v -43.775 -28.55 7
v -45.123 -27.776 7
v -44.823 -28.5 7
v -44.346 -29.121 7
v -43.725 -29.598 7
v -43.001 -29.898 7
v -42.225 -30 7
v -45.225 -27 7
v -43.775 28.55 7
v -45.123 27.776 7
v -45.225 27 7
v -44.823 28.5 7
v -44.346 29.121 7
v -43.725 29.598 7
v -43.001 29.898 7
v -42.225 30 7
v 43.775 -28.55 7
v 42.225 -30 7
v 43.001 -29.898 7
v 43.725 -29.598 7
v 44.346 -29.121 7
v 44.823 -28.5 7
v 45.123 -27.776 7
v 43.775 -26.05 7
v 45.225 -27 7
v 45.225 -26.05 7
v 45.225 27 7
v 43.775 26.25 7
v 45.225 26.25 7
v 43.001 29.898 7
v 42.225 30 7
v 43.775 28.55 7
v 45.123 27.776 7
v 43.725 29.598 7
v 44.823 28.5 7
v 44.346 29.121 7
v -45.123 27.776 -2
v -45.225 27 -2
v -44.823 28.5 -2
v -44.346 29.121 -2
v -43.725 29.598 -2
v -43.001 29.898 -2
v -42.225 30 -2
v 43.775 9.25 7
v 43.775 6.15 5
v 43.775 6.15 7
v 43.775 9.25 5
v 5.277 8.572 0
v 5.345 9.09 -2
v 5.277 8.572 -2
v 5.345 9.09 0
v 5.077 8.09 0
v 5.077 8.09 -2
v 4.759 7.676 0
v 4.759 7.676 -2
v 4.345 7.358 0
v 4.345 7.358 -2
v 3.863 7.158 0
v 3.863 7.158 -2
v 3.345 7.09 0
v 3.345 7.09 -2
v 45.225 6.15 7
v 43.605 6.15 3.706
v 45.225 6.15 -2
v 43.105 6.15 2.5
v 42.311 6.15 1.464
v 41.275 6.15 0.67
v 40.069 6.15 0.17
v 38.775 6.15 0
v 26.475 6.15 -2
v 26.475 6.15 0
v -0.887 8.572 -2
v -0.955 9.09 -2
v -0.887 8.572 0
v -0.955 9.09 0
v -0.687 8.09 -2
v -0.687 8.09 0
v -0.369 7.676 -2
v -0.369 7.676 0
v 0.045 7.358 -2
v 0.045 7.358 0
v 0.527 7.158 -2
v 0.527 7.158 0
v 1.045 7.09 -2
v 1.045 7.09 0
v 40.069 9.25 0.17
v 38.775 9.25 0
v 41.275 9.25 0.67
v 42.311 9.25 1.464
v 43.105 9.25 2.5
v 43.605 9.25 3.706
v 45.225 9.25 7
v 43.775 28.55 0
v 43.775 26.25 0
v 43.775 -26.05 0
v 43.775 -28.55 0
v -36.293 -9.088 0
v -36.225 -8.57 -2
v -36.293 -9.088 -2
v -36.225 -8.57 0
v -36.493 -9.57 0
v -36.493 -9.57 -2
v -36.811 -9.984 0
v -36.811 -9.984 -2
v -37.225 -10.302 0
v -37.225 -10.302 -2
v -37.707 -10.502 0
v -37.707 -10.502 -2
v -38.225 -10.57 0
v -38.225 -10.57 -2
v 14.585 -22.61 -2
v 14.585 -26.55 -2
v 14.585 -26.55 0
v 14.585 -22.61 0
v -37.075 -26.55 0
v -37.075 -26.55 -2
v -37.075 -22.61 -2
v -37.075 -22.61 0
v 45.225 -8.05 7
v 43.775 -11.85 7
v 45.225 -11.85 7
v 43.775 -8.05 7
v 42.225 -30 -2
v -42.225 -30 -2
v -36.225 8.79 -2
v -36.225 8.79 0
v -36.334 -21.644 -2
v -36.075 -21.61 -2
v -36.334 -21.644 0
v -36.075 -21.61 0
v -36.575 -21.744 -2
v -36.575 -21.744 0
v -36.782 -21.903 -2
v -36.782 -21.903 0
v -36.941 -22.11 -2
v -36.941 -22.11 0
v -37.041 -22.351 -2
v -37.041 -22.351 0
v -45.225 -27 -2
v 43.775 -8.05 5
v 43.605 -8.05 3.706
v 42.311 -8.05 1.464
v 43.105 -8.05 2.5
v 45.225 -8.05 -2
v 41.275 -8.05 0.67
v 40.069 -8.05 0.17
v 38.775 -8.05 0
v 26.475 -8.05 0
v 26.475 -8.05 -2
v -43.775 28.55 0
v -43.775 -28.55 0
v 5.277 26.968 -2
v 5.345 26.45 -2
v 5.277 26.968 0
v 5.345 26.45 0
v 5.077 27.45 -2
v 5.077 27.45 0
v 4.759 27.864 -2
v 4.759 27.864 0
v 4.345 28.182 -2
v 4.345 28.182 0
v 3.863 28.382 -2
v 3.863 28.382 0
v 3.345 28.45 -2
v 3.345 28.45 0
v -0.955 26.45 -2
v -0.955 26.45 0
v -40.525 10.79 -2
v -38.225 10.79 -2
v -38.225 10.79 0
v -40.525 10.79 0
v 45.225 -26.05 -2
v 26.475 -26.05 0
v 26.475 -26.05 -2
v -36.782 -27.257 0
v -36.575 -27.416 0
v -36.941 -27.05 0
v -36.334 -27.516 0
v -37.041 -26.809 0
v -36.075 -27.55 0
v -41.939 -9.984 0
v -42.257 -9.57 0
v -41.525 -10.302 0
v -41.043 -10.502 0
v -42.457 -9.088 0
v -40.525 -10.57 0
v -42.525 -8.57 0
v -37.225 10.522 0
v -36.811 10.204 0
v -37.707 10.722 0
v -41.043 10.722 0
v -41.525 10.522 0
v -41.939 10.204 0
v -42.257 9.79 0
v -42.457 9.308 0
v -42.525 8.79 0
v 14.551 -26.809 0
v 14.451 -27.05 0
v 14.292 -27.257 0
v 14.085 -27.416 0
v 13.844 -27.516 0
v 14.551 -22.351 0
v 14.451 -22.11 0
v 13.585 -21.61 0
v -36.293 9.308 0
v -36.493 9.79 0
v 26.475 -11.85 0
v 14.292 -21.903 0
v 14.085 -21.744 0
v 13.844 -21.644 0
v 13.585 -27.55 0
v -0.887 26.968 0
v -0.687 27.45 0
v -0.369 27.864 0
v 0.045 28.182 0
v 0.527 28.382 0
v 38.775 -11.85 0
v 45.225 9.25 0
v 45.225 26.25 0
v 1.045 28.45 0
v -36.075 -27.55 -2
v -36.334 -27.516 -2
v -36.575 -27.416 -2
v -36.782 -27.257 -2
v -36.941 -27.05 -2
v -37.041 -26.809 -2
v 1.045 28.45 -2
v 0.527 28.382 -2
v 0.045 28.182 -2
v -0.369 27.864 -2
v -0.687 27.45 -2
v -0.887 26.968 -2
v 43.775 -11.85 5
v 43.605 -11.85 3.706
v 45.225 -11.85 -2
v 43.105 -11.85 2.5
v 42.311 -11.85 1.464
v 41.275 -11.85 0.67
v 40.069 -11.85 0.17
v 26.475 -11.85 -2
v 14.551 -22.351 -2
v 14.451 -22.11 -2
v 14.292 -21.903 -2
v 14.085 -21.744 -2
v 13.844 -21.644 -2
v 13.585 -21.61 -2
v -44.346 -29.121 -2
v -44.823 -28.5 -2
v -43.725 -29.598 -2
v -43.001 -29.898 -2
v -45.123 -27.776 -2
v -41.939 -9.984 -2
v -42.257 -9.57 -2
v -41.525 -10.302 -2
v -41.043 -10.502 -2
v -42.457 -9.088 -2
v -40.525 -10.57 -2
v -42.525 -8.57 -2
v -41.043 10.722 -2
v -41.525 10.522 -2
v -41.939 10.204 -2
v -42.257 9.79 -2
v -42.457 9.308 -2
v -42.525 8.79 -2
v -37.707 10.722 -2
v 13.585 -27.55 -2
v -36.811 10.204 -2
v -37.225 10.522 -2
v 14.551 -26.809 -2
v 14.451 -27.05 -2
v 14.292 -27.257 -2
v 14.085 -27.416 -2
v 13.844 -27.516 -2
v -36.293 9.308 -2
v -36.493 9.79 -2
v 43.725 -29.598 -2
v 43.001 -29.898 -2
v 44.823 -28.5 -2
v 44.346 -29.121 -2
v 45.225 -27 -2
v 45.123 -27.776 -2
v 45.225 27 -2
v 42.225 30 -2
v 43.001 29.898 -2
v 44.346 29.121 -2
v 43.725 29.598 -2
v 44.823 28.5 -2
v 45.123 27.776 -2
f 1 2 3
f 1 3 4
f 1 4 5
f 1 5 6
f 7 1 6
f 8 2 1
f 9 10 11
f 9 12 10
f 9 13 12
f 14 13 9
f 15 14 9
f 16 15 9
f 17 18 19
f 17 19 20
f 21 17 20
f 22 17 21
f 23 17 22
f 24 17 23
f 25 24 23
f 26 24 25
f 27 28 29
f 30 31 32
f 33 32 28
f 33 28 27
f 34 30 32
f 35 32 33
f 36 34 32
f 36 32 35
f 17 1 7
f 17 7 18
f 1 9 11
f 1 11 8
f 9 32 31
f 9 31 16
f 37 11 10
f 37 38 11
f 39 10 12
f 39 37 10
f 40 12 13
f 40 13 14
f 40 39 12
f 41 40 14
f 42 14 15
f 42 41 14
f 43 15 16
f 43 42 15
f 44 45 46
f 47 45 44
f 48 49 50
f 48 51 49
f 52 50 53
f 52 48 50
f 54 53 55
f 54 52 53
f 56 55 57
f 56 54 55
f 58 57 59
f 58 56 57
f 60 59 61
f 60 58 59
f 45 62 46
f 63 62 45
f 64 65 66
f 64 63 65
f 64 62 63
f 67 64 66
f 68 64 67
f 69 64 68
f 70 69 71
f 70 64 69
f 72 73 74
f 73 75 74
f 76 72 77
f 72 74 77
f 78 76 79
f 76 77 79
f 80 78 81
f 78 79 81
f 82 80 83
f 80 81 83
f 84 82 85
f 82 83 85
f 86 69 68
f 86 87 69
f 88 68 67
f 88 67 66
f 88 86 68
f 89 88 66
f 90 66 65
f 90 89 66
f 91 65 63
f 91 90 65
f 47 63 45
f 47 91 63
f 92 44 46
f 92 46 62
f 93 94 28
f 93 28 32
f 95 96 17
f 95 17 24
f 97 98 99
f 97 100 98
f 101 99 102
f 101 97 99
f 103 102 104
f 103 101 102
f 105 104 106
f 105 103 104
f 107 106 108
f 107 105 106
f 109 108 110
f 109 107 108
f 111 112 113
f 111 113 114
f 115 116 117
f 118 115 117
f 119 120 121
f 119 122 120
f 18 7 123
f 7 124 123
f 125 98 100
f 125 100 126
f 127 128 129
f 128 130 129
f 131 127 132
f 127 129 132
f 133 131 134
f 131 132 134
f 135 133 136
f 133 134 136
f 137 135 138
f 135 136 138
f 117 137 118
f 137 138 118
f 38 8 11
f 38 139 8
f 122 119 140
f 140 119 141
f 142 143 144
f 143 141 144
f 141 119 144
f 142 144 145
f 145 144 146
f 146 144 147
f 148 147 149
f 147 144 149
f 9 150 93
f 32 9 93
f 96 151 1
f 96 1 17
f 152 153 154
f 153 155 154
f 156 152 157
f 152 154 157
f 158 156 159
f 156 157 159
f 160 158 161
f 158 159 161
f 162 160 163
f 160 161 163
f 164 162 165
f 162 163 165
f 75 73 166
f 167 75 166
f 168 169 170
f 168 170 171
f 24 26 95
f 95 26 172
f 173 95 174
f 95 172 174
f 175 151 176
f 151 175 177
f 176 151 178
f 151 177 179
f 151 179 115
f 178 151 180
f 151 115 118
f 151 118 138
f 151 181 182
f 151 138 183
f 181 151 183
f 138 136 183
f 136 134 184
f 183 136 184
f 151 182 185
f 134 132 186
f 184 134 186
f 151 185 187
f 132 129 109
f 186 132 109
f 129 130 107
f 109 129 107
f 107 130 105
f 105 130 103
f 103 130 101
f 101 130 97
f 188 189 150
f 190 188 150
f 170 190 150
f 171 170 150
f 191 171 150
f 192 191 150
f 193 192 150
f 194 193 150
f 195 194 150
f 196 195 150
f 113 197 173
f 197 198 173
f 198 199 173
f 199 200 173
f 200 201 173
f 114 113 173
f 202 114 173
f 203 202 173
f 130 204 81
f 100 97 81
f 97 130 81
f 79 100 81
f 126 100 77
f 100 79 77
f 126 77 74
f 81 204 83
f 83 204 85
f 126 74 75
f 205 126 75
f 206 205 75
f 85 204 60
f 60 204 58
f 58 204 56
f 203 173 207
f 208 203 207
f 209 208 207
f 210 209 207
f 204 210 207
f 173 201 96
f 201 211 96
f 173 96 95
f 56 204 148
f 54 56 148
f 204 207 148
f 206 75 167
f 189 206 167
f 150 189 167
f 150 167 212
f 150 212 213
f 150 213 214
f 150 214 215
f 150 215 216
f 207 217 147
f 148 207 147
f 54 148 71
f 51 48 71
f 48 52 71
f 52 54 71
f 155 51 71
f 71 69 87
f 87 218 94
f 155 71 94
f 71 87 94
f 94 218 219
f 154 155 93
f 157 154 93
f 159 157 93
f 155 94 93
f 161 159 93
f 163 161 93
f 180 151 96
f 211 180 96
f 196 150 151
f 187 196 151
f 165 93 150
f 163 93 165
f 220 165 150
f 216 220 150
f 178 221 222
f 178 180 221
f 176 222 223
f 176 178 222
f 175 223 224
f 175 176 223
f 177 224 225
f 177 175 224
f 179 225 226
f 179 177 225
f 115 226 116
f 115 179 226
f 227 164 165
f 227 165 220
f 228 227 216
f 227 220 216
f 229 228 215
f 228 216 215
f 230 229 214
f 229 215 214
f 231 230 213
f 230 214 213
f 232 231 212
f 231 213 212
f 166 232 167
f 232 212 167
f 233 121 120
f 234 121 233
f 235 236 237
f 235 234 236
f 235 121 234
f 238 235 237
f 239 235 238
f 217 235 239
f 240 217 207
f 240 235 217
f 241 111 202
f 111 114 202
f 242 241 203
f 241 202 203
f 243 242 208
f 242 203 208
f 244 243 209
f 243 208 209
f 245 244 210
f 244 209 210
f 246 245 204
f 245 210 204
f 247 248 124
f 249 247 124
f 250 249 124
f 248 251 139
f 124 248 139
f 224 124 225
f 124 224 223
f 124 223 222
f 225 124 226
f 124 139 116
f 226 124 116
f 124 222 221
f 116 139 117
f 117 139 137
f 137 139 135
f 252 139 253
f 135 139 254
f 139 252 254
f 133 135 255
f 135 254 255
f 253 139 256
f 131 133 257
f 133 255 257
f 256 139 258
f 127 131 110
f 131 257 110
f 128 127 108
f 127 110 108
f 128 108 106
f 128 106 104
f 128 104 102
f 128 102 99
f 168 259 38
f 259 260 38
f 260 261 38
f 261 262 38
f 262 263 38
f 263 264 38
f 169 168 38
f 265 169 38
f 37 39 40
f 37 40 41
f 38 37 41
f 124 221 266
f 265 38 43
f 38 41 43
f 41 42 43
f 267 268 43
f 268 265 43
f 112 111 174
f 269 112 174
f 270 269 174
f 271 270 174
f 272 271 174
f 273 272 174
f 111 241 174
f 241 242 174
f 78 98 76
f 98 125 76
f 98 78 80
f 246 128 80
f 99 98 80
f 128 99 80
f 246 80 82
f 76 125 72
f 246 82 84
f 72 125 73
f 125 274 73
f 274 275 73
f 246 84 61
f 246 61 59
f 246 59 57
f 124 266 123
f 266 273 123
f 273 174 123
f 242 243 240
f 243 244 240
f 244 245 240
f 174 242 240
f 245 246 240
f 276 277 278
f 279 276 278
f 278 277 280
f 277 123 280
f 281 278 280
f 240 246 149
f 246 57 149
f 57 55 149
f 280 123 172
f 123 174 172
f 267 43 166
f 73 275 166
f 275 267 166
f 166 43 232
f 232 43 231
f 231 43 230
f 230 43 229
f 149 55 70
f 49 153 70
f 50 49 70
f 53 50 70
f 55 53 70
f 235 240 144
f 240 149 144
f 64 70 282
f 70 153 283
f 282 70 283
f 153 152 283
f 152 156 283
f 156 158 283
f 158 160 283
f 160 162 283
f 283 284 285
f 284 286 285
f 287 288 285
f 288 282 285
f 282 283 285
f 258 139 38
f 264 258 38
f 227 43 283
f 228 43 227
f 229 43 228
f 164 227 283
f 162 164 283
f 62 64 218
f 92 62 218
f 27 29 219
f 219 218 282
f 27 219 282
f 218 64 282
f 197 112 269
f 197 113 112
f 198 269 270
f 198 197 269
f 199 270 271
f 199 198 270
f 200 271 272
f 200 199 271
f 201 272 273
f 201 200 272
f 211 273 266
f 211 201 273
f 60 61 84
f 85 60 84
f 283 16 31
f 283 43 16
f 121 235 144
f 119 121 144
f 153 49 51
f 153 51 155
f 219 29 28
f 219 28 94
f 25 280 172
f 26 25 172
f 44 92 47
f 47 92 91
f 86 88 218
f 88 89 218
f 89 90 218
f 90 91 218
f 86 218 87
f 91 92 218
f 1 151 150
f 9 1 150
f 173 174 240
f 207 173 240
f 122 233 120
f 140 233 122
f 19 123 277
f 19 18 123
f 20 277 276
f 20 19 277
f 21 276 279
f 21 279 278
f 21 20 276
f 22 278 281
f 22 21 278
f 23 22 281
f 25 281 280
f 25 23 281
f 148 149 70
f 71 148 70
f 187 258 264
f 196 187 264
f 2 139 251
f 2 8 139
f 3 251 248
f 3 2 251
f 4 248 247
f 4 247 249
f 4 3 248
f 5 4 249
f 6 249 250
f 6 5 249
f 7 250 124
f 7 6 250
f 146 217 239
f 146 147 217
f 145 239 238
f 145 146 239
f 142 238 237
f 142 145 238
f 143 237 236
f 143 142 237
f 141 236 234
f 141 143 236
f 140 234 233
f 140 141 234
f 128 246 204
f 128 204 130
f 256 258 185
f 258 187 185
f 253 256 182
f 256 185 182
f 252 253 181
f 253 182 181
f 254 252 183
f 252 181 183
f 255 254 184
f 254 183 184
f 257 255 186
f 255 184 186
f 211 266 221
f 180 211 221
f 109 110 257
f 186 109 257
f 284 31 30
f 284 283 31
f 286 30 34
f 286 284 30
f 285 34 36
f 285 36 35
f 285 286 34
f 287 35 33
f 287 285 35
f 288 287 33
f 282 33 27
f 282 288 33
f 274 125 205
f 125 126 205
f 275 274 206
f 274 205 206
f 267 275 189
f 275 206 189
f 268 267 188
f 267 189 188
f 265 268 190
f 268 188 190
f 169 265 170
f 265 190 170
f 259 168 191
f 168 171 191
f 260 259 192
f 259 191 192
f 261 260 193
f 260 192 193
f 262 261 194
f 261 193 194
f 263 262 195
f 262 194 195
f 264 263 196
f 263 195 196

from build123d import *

# Parameters (mm, degrees)
CROQUIS1_W              = 90.45
CROQUIS1_H              = 60
SALIENTE_EXTRUIR1_DEPTH = 2
CROQUIS2_W              = 90.45
CROQUIS2_H              = 60
CROQUIS2_W_2            = 87.55
CROQUIS2_H_2            = 57.1
SALIENTE_EXTRUIR2_DEPTH = 7
CROQUIS3_W              = 18.75
CROQUIS3_H              = 14.2
CORTAR_EXTRUIR1_DEPTH   = 9
CORTAR_EXTRUIR2_REACH   = 92.45
CROQUIS4_W              = 7
CROQUIS4_H              = 17
REDONDEO2_R             = 3
CROQUIS5_W              = 51.66
CROQUIS5_H              = 5.94
CORTAR_EXTRUIR3_DEPTH   = 2
CROQUIS6_W              = 6.3
CROQUIS6_H              = 21.36
CORTAR_EXTRUIR4_DEPTH   = 2
REDONDEO3_R             = 2
REDONDEO4_R             = 1
REDONDEO5_R             = 5


with BuildPart() as part:
    # Croquis1 → Saliente-Extruir1 (new body)
    with BuildSketch(Plane.XY):
        Rectangle(CROQUIS1_W, CROQUIS1_H)
    extrude(amount=-SALIENTE_EXTRUIR1_DEPTH)

    # Croquis2 → Saliente-Extruir2 (add)
    with BuildSketch(Plane.XY):
        Rectangle(CROQUIS2_W, CROQUIS2_H)
        Rectangle(CROQUIS2_W_2, CROQUIS2_H_2, mode=Mode.SUBTRACT)
    extrude(amount=SALIENTE_EXTRUIR2_DEPTH)

    # Croquis3 → Cortar-Extruir1 (cut)
    with BuildSketch(Plane(origin=(0, 0, -2), x_dir=(-1, 0, 0), z_dir=(0, 0, -1))):
        with Locations((-35.85, -18.95)):
            Rectangle(CROQUIS3_W, CROQUIS3_H)
        with Locations((-35.85, -0.95)):
            Rectangle(CROQUIS3_W, CROQUIS3_H)
    extrude(amount=-CORTAR_EXTRUIR1_DEPTH, mode=Mode.SUBTRACT)

    # Croquis4 → Cortar-Extruir2 (cut, up to next)
    with BuildSketch(Plane(origin=(45.225, 0, 0), x_dir=(0, 0, -1), z_dir=(1, 0, 0)), mode=Mode.PRIVATE) as cortar_extruir2_sk1:
        with Locations((-3.5, 17.75)):
            Rectangle(CROQUIS4_W, CROQUIS4_H)
    cortar_extruir2_tool1 = extrude(cortar_extruir2_sk1.sketch, amount=-CORTAR_EXTRUIR2_REACH, mode=Mode.PRIVATE) & part.part
    add(cortar_extruir2_tool1.solids().sort_by_distance((45.225, 17.75, 3.5))[0], mode=Mode.SUBTRACT)

    # Redondeo2
    redondeo2_edges = [part.edges().sort_by_distance(p)[0] for p in [
        (45.225, -30, 2.5),
        (-45.225, -30, 2.5),
        (-45.225, 30, 2.5),
        (45.225, 30, 2.5),
    ]]
    fillet(redondeo2_edges, radius=REDONDEO2_R)

    # Croquis5 → Cortar-Extruir3 (cut)
    with BuildSketch(Plane(origin=(0, 0, -2), x_dir=(-1, 0, 0), z_dir=(0, 0, -1))):
        with Locations((11.245, -24.58)):
            Rectangle(CROQUIS5_W, CROQUIS5_H)
    extrude(amount=-CORTAR_EXTRUIR3_DEPTH, mode=Mode.SUBTRACT)

    # Croquis6 → Cortar-Extruir4 (cut)
    with BuildSketch(Plane(origin=(0, 0, -2), x_dir=(-1, 0, 0), z_dir=(0, 0, -1))):
        with Locations((39.375, 0.11)):
            Rectangle(CROQUIS6_W, CROQUIS6_H)
        with Locations((-2.195, 17.77)):
            Rectangle(CROQUIS6_W, CROQUIS6_H)
    extrude(amount=-CORTAR_EXTRUIR4_DEPTH, mode=Mode.SUBTRACT)

    # Redondeo3
    redondeo3_edges = [part.edges().sort_by_distance(p)[0] for p in [
        (-36.225, -10.57, -1),
        (-36.225, 10.79, -1),
        (-42.525, 10.79, -1),
        (-42.525, -10.57, -1),
        (5.345, 7.09, -1),
        (5.345, 28.45, -1),
        (-0.955, 28.45, -1),
        (-0.955, 7.09, -1),
    ]]
    fillet(redondeo3_edges, radius=REDONDEO3_R)

    # Redondeo4
    redondeo4_edges = [part.edges().sort_by_distance(p)[0] for p in [
        (14.585, -27.55, -1),
        (14.585, -21.61, -1),
        (-37.075, -21.61, -1),
        (-37.075, -27.55, -1),
    ]]
    fillet(redondeo4_edges, radius=REDONDEO4_R)

    # Redondeo5
    redondeo5_edges = [part.edges().sort_by_distance(p)[0] for p in [
        (43.775, -9.95, 0),
        (43.775, 7.7, 0),
    ]]
    fillet(redondeo5_edges, radius=REDONDEO5_R)


solid = part.part
